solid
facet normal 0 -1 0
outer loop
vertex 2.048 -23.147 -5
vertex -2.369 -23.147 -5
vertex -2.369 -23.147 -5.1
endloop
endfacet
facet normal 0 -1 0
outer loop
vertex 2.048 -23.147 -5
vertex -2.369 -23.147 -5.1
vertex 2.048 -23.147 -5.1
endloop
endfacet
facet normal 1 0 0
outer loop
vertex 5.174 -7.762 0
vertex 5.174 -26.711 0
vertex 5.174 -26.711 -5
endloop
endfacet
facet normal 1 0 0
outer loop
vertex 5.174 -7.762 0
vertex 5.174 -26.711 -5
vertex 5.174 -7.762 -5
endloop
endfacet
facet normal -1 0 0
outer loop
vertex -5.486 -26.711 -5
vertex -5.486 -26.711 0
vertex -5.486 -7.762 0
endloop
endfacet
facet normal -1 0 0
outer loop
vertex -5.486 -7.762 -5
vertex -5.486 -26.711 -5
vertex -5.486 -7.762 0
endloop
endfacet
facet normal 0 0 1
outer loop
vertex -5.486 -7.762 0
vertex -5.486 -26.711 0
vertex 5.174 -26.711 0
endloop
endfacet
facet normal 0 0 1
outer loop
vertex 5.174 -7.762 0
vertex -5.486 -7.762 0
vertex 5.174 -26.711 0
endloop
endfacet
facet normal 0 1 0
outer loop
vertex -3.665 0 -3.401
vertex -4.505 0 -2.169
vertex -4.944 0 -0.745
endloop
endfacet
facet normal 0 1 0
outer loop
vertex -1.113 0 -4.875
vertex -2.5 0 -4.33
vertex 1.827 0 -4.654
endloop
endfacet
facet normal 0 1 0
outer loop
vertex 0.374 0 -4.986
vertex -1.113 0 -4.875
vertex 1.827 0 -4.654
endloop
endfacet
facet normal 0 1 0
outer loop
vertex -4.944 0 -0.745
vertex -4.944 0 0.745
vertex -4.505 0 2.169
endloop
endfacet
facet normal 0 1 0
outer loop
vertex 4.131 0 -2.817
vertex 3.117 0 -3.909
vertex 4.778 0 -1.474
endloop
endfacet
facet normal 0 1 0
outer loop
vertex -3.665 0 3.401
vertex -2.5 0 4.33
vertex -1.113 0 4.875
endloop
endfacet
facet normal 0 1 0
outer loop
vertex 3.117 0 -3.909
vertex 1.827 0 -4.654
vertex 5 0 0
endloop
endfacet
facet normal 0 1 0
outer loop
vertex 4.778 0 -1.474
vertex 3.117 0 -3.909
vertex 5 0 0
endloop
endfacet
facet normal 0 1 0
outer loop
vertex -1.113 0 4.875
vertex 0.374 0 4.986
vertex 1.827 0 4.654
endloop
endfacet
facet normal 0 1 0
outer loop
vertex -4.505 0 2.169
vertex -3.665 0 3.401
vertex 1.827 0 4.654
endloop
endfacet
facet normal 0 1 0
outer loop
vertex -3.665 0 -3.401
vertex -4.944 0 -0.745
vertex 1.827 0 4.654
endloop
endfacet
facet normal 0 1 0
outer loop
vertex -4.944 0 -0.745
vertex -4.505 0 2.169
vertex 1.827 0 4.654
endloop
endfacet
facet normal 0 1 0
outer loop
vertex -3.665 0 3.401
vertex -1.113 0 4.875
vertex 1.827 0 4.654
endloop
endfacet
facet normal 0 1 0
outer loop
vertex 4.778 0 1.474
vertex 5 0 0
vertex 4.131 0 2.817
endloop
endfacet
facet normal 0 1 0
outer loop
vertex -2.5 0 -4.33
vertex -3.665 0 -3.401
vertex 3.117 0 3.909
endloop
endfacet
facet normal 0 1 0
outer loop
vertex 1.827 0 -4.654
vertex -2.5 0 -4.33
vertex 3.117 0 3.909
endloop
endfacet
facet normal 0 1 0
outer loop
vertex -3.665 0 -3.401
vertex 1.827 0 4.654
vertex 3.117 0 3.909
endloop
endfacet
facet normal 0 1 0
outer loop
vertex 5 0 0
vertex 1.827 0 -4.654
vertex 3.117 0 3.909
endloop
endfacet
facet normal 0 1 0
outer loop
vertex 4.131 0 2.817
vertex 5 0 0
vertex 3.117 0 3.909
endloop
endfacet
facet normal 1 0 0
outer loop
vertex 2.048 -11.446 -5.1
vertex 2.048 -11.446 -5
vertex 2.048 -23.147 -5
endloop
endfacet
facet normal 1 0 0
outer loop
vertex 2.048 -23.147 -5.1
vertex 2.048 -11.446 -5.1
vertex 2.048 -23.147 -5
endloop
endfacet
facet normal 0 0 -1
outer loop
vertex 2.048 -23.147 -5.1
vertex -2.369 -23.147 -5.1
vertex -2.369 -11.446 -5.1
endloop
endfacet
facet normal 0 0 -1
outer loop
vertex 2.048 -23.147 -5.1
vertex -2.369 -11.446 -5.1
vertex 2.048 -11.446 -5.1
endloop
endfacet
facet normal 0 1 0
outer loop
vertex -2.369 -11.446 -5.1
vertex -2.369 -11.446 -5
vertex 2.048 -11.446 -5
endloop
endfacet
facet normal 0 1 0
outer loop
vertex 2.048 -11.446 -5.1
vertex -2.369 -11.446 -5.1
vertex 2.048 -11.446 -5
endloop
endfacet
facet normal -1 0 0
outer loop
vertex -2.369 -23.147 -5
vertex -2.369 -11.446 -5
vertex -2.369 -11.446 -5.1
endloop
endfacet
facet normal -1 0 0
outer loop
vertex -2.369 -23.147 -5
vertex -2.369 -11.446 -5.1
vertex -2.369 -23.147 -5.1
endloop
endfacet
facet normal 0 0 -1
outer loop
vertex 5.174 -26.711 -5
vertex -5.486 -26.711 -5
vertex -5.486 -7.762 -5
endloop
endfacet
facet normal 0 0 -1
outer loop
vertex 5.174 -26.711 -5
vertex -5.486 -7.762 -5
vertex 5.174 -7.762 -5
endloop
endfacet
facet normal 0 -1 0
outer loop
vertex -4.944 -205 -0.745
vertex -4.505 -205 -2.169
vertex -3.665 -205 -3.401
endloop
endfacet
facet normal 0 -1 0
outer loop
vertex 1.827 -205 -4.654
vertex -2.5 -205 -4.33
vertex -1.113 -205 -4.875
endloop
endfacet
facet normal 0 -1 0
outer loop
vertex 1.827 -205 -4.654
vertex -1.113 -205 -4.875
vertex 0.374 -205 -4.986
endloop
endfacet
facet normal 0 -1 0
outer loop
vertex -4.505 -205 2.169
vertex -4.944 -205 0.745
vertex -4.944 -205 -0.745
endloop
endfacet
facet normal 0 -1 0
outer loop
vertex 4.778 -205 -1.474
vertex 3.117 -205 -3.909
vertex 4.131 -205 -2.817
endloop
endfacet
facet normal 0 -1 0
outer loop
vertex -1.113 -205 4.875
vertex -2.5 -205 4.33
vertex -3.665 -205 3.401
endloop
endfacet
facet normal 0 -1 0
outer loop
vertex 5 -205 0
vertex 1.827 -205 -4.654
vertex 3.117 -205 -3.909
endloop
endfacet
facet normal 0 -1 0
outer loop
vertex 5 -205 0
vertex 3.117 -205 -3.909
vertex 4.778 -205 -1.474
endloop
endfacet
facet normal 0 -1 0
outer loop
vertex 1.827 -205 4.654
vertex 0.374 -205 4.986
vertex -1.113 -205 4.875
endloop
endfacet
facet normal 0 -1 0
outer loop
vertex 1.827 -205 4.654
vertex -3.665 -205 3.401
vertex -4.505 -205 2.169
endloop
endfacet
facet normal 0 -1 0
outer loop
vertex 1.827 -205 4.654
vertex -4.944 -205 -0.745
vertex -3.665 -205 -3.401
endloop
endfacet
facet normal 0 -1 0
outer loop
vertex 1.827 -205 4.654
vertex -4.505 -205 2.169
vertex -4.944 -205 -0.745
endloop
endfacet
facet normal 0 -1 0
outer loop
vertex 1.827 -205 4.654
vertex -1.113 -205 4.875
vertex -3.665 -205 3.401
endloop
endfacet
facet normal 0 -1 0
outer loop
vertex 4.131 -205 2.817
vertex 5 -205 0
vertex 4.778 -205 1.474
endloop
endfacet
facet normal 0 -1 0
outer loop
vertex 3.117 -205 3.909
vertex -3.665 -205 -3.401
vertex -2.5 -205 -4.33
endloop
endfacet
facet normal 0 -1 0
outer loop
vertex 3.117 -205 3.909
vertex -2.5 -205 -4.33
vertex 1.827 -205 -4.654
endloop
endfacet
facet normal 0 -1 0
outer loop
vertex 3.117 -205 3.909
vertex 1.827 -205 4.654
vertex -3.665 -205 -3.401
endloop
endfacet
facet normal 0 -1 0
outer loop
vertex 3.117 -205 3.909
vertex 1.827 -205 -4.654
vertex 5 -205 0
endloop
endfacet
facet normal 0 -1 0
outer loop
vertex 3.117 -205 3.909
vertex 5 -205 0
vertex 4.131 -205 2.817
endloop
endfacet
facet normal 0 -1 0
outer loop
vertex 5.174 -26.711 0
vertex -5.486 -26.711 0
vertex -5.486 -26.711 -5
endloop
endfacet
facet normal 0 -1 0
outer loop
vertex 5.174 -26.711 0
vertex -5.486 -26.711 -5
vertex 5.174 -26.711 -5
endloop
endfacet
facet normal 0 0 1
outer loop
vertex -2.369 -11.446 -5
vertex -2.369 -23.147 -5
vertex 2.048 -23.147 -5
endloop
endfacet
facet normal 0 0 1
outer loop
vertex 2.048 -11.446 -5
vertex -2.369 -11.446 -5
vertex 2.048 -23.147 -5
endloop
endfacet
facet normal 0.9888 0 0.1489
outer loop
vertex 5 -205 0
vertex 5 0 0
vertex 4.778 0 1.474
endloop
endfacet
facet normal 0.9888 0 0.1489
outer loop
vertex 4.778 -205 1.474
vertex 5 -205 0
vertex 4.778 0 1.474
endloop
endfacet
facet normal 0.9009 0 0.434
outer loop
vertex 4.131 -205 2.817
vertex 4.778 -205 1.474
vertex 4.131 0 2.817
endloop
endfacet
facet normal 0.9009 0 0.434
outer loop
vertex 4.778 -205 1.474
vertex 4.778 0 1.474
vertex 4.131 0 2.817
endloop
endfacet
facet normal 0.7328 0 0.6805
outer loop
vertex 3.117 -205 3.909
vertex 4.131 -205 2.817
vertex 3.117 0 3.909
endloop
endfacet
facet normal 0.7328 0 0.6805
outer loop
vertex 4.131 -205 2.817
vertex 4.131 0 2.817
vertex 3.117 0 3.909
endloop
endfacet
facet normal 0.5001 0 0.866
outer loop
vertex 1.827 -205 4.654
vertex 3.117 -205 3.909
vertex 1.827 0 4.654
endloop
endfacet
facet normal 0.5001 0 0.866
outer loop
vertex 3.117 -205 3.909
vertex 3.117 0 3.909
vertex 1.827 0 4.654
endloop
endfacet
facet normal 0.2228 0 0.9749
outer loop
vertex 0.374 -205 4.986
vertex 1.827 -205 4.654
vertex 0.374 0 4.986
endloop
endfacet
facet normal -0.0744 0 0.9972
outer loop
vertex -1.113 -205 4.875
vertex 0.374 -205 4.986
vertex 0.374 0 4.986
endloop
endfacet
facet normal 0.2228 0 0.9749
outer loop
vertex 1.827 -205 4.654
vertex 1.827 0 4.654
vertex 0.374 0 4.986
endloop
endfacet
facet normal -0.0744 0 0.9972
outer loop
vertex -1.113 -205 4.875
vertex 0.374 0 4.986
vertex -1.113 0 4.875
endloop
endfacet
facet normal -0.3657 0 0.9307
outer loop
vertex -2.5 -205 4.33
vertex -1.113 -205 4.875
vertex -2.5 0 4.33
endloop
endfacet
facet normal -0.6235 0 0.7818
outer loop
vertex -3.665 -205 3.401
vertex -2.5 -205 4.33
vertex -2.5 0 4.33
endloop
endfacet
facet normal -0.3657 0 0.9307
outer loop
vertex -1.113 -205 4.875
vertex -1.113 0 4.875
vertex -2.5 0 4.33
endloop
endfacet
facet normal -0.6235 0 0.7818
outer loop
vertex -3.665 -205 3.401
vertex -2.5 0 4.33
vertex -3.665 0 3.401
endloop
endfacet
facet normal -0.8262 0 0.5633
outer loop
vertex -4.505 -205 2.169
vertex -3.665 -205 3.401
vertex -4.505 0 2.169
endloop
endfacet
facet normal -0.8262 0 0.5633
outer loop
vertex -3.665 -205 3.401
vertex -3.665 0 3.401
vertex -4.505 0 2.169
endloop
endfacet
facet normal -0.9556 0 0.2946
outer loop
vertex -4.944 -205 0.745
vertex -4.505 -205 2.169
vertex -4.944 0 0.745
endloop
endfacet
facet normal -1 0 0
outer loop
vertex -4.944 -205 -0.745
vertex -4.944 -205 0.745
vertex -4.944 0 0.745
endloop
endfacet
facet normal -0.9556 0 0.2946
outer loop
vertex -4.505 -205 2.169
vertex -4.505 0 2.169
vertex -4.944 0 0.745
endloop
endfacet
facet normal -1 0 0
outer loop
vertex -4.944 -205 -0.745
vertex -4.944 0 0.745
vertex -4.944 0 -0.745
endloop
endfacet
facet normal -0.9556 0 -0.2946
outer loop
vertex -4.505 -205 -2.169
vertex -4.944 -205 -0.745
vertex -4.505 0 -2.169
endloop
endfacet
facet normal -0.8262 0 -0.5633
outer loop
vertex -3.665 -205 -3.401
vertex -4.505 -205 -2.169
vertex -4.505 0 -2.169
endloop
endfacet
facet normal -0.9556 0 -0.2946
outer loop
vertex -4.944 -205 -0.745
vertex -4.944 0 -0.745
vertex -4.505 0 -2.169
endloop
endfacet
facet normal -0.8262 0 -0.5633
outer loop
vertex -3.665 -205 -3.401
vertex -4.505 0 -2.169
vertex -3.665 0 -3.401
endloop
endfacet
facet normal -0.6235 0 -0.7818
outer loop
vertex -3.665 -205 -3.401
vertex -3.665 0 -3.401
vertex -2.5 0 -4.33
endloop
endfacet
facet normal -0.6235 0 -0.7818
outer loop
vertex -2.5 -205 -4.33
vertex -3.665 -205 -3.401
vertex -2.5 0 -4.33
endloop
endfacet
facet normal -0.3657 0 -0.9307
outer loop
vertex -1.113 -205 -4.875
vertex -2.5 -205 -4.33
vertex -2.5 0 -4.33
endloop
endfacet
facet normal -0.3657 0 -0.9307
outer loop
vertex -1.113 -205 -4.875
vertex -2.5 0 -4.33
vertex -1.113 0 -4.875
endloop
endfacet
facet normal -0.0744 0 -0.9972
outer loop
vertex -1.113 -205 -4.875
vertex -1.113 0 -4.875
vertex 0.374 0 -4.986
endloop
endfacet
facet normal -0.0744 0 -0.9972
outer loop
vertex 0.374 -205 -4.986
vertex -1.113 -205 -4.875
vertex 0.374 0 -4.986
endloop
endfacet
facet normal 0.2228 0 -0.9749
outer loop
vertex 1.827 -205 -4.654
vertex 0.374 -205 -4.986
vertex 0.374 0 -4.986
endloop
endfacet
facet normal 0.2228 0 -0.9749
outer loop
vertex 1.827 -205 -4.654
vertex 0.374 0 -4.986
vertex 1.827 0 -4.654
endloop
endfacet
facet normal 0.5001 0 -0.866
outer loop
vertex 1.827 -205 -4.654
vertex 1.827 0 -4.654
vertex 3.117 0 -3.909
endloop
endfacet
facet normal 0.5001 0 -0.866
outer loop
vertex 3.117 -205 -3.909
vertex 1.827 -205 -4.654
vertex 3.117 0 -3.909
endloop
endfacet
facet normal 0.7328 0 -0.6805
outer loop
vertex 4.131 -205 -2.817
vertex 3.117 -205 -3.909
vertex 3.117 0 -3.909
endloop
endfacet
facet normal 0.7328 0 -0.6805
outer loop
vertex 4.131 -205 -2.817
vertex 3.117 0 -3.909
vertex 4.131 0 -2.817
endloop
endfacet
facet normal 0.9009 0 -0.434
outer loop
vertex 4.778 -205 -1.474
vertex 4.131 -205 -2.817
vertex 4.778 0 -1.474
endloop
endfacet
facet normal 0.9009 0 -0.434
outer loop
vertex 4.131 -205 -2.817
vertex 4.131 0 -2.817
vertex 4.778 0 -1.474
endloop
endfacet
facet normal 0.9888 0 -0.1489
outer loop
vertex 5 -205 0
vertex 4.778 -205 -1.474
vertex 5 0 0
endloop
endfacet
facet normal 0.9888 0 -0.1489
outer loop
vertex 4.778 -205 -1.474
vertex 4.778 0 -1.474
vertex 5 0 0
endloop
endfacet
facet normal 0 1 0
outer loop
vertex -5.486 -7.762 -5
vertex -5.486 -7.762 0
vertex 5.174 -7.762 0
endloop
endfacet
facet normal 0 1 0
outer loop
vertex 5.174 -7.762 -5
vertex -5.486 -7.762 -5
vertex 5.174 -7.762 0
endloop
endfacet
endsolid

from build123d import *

# Parameters (mm, degrees)
F4_R     = 5
F0_DEPTH = 205
F1_W     = 10.6594
F1_H     = 18.948621
F2_DEPTH = 5
F3_W     = 4.417351
F3_H     = 11.700945
F5_DEPTH = 0.1


with BuildPart() as f0:
    # F4 (on Front) → F0 (new body)
    with BuildSketch(Plane.XZ):
        Circle(F4_R)
    extrude(amount=F0_DEPTH)


with BuildPart() as f2:
    # F1 (on Top) → F2 (new body)
    with BuildSketch(Plane.XY):
        with Locations((-0.156038, -17.23652)):
            Rectangle(F1_W, F1_H)
    extrude(amount=-F2_DEPTH)


with BuildPart() as f5:
    # F3 (on face) → F5 (new body)
    with BuildSketch(Plane(origin=(0, 0, -5), x_dir=(1, 0, 0), z_dir=(0, 0, -1))):
        with Locations((-0.160421, 17.296107)):
            Rectangle(F3_W, F3_H)
    extrude(amount=F5_DEPTH)


solid = Compound([f0.part, f2.part, f5.part])
